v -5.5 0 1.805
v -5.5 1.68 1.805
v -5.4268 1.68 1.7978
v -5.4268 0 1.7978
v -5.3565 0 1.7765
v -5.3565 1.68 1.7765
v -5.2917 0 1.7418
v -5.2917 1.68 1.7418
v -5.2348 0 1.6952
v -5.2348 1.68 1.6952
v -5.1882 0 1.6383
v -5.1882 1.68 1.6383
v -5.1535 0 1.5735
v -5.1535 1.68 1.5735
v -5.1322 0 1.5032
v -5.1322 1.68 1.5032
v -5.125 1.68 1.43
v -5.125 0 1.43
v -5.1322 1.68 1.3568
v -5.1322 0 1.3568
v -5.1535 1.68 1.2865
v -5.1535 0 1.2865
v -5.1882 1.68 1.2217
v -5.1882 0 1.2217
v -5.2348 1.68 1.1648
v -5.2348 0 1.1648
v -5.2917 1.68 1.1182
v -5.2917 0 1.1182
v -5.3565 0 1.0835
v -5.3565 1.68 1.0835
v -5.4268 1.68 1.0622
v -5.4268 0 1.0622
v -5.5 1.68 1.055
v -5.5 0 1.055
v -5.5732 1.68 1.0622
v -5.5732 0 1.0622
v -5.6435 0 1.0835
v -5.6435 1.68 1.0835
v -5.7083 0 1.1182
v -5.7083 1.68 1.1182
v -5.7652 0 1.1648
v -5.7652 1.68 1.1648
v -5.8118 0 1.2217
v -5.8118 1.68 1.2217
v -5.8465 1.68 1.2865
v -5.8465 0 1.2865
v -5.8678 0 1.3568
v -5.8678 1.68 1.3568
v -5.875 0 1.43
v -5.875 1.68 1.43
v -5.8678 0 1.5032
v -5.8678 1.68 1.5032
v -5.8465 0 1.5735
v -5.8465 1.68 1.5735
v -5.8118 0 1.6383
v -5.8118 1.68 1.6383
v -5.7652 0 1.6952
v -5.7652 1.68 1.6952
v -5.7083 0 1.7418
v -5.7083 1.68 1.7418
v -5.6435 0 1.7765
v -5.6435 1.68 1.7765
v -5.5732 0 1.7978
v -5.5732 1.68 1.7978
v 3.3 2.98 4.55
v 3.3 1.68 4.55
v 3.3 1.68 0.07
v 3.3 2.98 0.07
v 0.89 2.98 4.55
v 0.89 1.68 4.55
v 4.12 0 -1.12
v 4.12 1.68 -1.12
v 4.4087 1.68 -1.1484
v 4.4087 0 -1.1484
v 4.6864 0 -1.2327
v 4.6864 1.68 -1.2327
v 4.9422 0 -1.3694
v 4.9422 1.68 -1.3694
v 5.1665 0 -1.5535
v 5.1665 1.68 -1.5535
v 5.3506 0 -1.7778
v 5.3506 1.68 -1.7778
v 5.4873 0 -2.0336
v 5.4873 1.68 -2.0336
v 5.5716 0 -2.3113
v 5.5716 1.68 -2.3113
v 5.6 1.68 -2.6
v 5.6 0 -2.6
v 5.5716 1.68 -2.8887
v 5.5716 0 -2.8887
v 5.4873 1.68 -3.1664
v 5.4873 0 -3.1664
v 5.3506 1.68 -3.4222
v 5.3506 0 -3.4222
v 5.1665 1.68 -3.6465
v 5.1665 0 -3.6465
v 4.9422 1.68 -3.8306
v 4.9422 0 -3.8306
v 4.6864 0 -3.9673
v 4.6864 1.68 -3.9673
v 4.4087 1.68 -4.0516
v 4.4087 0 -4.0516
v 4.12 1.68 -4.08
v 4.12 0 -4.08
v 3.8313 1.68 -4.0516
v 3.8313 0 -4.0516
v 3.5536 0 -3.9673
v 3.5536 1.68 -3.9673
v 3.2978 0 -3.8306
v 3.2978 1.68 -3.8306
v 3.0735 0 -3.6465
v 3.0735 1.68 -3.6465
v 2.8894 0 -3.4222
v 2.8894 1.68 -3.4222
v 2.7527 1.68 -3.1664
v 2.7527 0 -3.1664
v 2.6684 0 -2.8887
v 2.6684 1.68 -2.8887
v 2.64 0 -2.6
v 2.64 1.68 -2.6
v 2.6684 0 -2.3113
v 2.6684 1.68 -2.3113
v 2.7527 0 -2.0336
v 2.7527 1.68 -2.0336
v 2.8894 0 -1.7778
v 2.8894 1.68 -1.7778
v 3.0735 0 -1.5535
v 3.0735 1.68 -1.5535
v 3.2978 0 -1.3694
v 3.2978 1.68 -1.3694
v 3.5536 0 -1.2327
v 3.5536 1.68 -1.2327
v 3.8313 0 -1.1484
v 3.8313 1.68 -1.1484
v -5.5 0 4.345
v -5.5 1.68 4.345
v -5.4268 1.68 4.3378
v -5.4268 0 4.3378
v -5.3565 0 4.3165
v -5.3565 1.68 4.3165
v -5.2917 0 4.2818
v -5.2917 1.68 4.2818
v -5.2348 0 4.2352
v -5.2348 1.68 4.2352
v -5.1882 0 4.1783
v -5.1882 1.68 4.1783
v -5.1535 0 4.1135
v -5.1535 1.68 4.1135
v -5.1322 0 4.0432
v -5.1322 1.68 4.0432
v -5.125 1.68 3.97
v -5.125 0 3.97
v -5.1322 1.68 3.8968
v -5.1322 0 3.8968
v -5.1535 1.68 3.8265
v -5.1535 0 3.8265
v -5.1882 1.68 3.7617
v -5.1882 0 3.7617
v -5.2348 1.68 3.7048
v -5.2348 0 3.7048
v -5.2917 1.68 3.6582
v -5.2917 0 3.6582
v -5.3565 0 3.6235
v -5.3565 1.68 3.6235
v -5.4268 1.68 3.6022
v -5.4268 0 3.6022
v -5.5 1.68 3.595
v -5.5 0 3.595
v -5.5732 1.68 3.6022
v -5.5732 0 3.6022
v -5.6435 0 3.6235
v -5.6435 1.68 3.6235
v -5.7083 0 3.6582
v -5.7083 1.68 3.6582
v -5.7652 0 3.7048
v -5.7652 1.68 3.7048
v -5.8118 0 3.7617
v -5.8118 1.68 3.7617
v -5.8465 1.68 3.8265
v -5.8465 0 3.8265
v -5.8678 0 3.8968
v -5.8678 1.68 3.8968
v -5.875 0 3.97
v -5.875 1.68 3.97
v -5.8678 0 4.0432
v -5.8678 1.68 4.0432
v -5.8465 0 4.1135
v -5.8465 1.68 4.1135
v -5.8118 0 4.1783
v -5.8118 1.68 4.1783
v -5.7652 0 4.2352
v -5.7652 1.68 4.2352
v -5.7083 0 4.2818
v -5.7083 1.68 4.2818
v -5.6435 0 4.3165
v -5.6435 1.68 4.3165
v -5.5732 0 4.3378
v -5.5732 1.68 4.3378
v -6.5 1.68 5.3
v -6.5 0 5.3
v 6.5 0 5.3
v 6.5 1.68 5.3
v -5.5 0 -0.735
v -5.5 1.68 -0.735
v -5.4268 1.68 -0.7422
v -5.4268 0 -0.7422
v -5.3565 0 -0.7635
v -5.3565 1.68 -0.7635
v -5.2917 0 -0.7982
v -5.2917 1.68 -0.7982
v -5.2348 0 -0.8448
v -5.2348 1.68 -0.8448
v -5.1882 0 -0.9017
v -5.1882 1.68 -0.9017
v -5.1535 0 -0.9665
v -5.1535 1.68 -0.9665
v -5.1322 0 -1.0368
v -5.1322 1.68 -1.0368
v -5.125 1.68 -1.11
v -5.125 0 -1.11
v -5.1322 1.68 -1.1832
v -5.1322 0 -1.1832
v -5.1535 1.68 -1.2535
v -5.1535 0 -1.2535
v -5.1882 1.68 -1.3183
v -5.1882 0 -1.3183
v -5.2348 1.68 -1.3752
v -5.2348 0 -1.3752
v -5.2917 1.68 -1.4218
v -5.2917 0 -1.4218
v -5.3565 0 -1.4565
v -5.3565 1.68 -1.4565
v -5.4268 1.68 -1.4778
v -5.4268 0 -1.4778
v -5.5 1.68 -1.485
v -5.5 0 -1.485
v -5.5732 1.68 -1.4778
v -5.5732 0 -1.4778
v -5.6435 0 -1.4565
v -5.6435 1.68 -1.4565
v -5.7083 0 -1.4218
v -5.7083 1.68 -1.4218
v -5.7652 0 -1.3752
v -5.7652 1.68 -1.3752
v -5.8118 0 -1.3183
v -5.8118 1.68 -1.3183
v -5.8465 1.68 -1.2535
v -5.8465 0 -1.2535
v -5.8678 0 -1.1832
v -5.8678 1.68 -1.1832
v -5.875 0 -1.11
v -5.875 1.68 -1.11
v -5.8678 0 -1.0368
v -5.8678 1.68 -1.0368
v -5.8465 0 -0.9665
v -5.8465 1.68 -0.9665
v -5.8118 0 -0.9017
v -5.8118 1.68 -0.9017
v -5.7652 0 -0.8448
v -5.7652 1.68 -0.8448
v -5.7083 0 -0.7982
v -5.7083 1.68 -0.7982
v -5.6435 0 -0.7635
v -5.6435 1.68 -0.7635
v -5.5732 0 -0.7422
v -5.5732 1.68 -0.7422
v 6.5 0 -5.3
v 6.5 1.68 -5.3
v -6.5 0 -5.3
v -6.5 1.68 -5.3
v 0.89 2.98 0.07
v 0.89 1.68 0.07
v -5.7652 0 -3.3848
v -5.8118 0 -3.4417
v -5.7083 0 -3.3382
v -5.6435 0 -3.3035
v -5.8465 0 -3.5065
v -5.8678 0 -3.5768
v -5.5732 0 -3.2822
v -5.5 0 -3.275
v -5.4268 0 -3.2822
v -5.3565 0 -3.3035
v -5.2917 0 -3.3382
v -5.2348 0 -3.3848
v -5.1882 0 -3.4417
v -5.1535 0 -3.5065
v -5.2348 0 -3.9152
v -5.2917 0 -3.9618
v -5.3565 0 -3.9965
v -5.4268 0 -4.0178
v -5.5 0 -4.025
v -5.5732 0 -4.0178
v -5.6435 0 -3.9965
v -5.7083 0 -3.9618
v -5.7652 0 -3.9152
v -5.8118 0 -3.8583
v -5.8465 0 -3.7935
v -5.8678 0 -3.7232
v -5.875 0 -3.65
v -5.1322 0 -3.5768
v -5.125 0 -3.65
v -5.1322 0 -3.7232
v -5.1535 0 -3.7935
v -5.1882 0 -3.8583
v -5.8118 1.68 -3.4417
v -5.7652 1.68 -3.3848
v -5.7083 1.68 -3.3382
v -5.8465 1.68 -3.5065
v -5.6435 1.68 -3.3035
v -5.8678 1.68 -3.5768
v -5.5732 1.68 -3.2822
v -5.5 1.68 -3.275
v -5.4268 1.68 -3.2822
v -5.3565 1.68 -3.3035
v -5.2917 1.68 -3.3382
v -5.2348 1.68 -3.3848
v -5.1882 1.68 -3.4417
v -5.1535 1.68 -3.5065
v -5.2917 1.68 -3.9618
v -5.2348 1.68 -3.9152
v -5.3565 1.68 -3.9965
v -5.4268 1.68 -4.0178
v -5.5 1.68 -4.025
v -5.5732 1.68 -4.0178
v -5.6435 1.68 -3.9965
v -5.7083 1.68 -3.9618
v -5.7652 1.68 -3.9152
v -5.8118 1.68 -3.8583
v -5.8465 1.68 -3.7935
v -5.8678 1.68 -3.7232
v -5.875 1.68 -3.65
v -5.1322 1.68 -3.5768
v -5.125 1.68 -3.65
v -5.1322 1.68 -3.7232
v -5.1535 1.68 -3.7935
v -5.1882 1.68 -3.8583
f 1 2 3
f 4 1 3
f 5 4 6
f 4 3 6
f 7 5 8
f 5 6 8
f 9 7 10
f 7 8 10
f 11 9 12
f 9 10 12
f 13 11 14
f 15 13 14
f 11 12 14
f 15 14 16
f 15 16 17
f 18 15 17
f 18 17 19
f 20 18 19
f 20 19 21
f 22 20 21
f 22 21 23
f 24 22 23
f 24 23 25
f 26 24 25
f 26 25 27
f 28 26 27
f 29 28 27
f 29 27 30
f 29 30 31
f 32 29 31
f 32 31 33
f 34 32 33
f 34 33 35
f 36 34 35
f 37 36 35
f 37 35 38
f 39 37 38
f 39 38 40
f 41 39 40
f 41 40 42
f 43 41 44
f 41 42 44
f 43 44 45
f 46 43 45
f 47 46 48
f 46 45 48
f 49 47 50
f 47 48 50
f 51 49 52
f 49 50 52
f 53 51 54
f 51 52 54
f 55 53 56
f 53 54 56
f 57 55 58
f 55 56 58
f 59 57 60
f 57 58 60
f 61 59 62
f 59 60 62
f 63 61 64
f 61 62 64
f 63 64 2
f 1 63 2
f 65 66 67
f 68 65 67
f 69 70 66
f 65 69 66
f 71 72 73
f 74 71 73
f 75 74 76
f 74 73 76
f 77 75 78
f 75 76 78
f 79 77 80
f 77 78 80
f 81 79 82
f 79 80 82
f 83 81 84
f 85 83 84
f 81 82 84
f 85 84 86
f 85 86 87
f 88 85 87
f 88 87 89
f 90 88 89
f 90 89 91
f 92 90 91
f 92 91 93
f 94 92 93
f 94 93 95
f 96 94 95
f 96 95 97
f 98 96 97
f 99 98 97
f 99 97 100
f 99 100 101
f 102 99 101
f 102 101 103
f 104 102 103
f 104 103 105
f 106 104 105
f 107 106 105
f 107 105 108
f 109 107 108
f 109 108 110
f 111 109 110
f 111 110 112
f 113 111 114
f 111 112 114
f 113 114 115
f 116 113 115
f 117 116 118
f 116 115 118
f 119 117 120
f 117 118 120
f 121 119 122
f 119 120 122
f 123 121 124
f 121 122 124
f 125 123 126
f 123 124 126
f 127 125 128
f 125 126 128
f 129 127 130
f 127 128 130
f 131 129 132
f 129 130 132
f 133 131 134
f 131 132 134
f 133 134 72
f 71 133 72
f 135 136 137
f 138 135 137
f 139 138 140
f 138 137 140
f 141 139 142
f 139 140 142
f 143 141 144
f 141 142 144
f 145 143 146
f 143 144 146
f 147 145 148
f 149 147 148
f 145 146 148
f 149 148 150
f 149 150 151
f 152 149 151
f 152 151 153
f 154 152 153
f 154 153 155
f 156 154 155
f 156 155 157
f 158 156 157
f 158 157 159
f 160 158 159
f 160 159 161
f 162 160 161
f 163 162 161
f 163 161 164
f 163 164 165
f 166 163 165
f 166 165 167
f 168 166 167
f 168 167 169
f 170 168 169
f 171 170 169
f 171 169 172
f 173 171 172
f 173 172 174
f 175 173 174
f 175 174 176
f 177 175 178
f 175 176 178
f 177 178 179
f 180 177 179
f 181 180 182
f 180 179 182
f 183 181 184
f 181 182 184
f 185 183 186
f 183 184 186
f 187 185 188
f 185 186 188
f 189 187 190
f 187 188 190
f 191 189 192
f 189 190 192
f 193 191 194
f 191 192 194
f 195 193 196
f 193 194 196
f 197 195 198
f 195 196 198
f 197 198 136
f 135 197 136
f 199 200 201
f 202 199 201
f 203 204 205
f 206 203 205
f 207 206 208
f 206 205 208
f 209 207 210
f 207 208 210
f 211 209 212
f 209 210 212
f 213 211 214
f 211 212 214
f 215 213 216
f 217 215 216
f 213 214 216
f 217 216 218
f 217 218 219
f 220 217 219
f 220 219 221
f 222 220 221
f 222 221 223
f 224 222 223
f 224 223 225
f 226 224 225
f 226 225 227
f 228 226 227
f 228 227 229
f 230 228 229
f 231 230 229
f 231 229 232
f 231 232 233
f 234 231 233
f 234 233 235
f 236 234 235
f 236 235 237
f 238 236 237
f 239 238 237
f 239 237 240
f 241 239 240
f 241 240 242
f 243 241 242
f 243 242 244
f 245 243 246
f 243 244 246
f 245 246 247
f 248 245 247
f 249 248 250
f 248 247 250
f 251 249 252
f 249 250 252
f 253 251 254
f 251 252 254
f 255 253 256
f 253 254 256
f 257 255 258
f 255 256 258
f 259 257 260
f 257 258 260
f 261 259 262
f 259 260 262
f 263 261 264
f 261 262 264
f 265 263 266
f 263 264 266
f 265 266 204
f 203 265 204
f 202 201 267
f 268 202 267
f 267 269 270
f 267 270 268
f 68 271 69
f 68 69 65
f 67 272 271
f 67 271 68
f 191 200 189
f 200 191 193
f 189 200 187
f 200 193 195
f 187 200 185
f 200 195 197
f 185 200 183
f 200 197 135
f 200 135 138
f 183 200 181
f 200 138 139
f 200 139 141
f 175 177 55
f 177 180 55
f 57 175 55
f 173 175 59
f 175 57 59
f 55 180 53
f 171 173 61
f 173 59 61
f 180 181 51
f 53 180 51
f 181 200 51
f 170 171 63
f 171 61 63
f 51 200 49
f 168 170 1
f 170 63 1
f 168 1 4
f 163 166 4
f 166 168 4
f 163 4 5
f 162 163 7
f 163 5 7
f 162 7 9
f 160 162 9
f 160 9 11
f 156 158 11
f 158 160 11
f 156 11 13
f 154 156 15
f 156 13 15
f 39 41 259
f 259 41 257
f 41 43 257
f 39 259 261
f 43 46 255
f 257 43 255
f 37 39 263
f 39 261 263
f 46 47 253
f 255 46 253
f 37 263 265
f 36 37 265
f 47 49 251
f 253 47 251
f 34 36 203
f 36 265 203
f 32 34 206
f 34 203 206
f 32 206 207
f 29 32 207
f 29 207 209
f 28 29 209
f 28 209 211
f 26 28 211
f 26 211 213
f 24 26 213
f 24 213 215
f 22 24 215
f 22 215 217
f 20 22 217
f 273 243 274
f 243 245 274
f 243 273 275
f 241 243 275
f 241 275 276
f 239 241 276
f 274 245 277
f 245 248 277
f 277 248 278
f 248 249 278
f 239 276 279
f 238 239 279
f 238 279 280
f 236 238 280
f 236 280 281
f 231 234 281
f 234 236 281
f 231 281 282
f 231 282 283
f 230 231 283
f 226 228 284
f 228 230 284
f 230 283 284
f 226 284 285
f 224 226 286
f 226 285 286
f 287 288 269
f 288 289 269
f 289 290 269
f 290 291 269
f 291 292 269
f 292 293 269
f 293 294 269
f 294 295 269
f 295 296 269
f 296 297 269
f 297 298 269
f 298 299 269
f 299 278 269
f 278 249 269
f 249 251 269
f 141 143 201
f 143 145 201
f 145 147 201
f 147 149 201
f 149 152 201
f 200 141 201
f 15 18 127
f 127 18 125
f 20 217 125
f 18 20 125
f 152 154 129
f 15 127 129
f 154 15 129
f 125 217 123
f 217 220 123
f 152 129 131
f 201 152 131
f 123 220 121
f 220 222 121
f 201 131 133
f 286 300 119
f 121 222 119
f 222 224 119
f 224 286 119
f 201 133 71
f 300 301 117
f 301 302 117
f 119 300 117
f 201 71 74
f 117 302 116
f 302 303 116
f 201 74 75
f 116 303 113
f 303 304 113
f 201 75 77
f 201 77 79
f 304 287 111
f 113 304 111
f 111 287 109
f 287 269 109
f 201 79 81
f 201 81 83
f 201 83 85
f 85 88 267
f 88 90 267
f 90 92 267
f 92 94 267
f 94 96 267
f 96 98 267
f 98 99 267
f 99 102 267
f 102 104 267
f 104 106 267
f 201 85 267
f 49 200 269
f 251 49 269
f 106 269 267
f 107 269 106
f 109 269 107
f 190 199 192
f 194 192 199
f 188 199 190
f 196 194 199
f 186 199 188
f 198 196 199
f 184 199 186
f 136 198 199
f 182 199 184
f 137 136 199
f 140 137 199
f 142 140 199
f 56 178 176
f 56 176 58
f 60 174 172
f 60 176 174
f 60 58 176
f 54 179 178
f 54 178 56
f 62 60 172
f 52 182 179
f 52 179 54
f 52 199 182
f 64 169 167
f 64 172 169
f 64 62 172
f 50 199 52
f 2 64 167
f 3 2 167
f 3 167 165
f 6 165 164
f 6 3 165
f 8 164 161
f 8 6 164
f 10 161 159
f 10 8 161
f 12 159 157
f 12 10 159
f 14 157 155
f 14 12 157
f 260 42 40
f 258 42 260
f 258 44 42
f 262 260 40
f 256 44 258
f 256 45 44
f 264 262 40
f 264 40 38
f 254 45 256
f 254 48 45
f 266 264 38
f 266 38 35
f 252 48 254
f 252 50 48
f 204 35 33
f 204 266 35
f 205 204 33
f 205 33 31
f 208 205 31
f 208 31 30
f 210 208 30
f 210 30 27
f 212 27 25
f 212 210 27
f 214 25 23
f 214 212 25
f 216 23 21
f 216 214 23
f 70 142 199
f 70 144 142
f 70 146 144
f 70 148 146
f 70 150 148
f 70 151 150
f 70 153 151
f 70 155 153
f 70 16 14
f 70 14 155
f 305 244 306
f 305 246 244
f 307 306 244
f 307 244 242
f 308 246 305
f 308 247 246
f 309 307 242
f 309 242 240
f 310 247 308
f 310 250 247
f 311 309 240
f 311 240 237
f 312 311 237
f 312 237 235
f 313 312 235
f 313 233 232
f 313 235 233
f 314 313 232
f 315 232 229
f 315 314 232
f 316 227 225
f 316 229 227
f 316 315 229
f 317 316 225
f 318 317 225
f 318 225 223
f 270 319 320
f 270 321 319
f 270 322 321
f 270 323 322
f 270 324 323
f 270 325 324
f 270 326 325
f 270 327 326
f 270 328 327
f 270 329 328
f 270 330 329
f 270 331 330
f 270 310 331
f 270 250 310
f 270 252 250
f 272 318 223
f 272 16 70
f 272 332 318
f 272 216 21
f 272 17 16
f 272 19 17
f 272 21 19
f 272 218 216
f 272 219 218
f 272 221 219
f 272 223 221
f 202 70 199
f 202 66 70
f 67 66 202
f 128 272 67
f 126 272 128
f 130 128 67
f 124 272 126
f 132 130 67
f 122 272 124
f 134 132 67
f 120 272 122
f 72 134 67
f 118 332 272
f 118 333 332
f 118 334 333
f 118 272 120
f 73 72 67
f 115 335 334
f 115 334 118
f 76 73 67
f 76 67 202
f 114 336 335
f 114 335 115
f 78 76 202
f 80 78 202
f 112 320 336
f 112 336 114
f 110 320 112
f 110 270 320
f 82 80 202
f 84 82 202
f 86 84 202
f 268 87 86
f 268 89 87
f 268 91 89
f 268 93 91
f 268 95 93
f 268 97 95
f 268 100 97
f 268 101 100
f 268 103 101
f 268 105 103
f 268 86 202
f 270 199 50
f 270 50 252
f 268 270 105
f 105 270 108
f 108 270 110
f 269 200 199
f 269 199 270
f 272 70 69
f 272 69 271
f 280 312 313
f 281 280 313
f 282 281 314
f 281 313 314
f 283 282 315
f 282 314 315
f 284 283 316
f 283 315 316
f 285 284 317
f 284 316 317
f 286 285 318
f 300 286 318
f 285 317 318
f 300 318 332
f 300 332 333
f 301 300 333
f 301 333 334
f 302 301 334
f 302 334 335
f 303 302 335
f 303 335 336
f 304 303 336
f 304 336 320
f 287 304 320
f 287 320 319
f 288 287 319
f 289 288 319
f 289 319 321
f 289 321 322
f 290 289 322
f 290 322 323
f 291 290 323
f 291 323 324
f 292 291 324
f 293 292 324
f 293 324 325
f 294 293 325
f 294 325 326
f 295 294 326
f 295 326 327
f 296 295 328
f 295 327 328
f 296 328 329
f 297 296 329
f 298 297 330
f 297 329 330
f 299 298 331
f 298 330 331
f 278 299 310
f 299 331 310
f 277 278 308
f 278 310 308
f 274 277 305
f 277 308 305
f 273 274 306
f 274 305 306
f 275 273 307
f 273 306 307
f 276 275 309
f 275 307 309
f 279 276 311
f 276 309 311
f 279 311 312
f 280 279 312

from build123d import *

# Parameters (mm, degrees)
CROQUIS1_W              = 13
CROQUIS1_H              = 10.6
SALIENTE_EXTRUIR1_DEPTH = 1.68
CROQUIS2_W              = 2.41
CROQUIS2_H              = 4.48
SALIENTE_EXTRUIR2_DEPTH = 1.3
CROQUIS3_R              = 1.48
CORTAR_EXTRUIR1_DEPTH   = 9.553502207
CROQUIS4_R              = 0.375
CORTAR_EXTRUIR2_DEPTH   = 9.553502207


with BuildPart() as part:
    # Croquis1 → Saliente-Extruir1 (new body)
    with BuildSketch(Plane(origin=(0, 0, 0), x_dir=(1, 0, 0), z_dir=(0, 1, 0))):
        Rectangle(CROQUIS1_W, CROQUIS1_H)
    extrude(amount=SALIENTE_EXTRUIR1_DEPTH)

    # Croquis2 → Saliente-Extruir2 (add)
    with BuildSketch(Plane(origin=(0, 1.68, 0), x_dir=(1, 0, 0), z_dir=(0, 1, 0))):
        with Locations((2.095, -2.31)):
            Rectangle(CROQUIS2_W, CROQUIS2_H)
    extrude(amount=SALIENTE_EXTRUIR2_DEPTH)

    # Croquis3 → Cortar-Extruir1 (cut, through all)
    with BuildSketch(Plane(origin=(0, 1.68, 0), x_dir=(1, 0, 0), z_dir=(0, 1, 0))):
        with Locations(Location((4.12, 2.6, 0), (0, 0, 270))):
            Circle(CROQUIS3_R)
    extrude(amount=-CORTAR_EXTRUIR1_DEPTH, mode=Mode.SUBTRACT)

    # Croquis4 → Cortar-Extruir2 (cut, through all)
    with BuildSketch(Plane(origin=(0, 1.68, 0), x_dir=(1, 0, 0), z_dir=(0, 1, 0))):
        with Locations(Location((-5.5, 3.65, 0), (0, 0, 270))):
            Circle(CROQUIS4_R)
        with Locations(Location((-5.5, 1.11, 0), (0, 0, 270))):
            Circle(CROQUIS4_R)
        with Locations(Location((-5.5, -1.43, 0), (0, 0, 270))):
            Circle(CROQUIS4_R)
        with Locations(Location((-5.5, -3.97, 0), (0, 0, 270))):
            Circle(CROQUIS4_R)
    extrude(amount=-CORTAR_EXTRUIR2_DEPTH, mode=Mode.SUBTRACT)


solid = part.part
